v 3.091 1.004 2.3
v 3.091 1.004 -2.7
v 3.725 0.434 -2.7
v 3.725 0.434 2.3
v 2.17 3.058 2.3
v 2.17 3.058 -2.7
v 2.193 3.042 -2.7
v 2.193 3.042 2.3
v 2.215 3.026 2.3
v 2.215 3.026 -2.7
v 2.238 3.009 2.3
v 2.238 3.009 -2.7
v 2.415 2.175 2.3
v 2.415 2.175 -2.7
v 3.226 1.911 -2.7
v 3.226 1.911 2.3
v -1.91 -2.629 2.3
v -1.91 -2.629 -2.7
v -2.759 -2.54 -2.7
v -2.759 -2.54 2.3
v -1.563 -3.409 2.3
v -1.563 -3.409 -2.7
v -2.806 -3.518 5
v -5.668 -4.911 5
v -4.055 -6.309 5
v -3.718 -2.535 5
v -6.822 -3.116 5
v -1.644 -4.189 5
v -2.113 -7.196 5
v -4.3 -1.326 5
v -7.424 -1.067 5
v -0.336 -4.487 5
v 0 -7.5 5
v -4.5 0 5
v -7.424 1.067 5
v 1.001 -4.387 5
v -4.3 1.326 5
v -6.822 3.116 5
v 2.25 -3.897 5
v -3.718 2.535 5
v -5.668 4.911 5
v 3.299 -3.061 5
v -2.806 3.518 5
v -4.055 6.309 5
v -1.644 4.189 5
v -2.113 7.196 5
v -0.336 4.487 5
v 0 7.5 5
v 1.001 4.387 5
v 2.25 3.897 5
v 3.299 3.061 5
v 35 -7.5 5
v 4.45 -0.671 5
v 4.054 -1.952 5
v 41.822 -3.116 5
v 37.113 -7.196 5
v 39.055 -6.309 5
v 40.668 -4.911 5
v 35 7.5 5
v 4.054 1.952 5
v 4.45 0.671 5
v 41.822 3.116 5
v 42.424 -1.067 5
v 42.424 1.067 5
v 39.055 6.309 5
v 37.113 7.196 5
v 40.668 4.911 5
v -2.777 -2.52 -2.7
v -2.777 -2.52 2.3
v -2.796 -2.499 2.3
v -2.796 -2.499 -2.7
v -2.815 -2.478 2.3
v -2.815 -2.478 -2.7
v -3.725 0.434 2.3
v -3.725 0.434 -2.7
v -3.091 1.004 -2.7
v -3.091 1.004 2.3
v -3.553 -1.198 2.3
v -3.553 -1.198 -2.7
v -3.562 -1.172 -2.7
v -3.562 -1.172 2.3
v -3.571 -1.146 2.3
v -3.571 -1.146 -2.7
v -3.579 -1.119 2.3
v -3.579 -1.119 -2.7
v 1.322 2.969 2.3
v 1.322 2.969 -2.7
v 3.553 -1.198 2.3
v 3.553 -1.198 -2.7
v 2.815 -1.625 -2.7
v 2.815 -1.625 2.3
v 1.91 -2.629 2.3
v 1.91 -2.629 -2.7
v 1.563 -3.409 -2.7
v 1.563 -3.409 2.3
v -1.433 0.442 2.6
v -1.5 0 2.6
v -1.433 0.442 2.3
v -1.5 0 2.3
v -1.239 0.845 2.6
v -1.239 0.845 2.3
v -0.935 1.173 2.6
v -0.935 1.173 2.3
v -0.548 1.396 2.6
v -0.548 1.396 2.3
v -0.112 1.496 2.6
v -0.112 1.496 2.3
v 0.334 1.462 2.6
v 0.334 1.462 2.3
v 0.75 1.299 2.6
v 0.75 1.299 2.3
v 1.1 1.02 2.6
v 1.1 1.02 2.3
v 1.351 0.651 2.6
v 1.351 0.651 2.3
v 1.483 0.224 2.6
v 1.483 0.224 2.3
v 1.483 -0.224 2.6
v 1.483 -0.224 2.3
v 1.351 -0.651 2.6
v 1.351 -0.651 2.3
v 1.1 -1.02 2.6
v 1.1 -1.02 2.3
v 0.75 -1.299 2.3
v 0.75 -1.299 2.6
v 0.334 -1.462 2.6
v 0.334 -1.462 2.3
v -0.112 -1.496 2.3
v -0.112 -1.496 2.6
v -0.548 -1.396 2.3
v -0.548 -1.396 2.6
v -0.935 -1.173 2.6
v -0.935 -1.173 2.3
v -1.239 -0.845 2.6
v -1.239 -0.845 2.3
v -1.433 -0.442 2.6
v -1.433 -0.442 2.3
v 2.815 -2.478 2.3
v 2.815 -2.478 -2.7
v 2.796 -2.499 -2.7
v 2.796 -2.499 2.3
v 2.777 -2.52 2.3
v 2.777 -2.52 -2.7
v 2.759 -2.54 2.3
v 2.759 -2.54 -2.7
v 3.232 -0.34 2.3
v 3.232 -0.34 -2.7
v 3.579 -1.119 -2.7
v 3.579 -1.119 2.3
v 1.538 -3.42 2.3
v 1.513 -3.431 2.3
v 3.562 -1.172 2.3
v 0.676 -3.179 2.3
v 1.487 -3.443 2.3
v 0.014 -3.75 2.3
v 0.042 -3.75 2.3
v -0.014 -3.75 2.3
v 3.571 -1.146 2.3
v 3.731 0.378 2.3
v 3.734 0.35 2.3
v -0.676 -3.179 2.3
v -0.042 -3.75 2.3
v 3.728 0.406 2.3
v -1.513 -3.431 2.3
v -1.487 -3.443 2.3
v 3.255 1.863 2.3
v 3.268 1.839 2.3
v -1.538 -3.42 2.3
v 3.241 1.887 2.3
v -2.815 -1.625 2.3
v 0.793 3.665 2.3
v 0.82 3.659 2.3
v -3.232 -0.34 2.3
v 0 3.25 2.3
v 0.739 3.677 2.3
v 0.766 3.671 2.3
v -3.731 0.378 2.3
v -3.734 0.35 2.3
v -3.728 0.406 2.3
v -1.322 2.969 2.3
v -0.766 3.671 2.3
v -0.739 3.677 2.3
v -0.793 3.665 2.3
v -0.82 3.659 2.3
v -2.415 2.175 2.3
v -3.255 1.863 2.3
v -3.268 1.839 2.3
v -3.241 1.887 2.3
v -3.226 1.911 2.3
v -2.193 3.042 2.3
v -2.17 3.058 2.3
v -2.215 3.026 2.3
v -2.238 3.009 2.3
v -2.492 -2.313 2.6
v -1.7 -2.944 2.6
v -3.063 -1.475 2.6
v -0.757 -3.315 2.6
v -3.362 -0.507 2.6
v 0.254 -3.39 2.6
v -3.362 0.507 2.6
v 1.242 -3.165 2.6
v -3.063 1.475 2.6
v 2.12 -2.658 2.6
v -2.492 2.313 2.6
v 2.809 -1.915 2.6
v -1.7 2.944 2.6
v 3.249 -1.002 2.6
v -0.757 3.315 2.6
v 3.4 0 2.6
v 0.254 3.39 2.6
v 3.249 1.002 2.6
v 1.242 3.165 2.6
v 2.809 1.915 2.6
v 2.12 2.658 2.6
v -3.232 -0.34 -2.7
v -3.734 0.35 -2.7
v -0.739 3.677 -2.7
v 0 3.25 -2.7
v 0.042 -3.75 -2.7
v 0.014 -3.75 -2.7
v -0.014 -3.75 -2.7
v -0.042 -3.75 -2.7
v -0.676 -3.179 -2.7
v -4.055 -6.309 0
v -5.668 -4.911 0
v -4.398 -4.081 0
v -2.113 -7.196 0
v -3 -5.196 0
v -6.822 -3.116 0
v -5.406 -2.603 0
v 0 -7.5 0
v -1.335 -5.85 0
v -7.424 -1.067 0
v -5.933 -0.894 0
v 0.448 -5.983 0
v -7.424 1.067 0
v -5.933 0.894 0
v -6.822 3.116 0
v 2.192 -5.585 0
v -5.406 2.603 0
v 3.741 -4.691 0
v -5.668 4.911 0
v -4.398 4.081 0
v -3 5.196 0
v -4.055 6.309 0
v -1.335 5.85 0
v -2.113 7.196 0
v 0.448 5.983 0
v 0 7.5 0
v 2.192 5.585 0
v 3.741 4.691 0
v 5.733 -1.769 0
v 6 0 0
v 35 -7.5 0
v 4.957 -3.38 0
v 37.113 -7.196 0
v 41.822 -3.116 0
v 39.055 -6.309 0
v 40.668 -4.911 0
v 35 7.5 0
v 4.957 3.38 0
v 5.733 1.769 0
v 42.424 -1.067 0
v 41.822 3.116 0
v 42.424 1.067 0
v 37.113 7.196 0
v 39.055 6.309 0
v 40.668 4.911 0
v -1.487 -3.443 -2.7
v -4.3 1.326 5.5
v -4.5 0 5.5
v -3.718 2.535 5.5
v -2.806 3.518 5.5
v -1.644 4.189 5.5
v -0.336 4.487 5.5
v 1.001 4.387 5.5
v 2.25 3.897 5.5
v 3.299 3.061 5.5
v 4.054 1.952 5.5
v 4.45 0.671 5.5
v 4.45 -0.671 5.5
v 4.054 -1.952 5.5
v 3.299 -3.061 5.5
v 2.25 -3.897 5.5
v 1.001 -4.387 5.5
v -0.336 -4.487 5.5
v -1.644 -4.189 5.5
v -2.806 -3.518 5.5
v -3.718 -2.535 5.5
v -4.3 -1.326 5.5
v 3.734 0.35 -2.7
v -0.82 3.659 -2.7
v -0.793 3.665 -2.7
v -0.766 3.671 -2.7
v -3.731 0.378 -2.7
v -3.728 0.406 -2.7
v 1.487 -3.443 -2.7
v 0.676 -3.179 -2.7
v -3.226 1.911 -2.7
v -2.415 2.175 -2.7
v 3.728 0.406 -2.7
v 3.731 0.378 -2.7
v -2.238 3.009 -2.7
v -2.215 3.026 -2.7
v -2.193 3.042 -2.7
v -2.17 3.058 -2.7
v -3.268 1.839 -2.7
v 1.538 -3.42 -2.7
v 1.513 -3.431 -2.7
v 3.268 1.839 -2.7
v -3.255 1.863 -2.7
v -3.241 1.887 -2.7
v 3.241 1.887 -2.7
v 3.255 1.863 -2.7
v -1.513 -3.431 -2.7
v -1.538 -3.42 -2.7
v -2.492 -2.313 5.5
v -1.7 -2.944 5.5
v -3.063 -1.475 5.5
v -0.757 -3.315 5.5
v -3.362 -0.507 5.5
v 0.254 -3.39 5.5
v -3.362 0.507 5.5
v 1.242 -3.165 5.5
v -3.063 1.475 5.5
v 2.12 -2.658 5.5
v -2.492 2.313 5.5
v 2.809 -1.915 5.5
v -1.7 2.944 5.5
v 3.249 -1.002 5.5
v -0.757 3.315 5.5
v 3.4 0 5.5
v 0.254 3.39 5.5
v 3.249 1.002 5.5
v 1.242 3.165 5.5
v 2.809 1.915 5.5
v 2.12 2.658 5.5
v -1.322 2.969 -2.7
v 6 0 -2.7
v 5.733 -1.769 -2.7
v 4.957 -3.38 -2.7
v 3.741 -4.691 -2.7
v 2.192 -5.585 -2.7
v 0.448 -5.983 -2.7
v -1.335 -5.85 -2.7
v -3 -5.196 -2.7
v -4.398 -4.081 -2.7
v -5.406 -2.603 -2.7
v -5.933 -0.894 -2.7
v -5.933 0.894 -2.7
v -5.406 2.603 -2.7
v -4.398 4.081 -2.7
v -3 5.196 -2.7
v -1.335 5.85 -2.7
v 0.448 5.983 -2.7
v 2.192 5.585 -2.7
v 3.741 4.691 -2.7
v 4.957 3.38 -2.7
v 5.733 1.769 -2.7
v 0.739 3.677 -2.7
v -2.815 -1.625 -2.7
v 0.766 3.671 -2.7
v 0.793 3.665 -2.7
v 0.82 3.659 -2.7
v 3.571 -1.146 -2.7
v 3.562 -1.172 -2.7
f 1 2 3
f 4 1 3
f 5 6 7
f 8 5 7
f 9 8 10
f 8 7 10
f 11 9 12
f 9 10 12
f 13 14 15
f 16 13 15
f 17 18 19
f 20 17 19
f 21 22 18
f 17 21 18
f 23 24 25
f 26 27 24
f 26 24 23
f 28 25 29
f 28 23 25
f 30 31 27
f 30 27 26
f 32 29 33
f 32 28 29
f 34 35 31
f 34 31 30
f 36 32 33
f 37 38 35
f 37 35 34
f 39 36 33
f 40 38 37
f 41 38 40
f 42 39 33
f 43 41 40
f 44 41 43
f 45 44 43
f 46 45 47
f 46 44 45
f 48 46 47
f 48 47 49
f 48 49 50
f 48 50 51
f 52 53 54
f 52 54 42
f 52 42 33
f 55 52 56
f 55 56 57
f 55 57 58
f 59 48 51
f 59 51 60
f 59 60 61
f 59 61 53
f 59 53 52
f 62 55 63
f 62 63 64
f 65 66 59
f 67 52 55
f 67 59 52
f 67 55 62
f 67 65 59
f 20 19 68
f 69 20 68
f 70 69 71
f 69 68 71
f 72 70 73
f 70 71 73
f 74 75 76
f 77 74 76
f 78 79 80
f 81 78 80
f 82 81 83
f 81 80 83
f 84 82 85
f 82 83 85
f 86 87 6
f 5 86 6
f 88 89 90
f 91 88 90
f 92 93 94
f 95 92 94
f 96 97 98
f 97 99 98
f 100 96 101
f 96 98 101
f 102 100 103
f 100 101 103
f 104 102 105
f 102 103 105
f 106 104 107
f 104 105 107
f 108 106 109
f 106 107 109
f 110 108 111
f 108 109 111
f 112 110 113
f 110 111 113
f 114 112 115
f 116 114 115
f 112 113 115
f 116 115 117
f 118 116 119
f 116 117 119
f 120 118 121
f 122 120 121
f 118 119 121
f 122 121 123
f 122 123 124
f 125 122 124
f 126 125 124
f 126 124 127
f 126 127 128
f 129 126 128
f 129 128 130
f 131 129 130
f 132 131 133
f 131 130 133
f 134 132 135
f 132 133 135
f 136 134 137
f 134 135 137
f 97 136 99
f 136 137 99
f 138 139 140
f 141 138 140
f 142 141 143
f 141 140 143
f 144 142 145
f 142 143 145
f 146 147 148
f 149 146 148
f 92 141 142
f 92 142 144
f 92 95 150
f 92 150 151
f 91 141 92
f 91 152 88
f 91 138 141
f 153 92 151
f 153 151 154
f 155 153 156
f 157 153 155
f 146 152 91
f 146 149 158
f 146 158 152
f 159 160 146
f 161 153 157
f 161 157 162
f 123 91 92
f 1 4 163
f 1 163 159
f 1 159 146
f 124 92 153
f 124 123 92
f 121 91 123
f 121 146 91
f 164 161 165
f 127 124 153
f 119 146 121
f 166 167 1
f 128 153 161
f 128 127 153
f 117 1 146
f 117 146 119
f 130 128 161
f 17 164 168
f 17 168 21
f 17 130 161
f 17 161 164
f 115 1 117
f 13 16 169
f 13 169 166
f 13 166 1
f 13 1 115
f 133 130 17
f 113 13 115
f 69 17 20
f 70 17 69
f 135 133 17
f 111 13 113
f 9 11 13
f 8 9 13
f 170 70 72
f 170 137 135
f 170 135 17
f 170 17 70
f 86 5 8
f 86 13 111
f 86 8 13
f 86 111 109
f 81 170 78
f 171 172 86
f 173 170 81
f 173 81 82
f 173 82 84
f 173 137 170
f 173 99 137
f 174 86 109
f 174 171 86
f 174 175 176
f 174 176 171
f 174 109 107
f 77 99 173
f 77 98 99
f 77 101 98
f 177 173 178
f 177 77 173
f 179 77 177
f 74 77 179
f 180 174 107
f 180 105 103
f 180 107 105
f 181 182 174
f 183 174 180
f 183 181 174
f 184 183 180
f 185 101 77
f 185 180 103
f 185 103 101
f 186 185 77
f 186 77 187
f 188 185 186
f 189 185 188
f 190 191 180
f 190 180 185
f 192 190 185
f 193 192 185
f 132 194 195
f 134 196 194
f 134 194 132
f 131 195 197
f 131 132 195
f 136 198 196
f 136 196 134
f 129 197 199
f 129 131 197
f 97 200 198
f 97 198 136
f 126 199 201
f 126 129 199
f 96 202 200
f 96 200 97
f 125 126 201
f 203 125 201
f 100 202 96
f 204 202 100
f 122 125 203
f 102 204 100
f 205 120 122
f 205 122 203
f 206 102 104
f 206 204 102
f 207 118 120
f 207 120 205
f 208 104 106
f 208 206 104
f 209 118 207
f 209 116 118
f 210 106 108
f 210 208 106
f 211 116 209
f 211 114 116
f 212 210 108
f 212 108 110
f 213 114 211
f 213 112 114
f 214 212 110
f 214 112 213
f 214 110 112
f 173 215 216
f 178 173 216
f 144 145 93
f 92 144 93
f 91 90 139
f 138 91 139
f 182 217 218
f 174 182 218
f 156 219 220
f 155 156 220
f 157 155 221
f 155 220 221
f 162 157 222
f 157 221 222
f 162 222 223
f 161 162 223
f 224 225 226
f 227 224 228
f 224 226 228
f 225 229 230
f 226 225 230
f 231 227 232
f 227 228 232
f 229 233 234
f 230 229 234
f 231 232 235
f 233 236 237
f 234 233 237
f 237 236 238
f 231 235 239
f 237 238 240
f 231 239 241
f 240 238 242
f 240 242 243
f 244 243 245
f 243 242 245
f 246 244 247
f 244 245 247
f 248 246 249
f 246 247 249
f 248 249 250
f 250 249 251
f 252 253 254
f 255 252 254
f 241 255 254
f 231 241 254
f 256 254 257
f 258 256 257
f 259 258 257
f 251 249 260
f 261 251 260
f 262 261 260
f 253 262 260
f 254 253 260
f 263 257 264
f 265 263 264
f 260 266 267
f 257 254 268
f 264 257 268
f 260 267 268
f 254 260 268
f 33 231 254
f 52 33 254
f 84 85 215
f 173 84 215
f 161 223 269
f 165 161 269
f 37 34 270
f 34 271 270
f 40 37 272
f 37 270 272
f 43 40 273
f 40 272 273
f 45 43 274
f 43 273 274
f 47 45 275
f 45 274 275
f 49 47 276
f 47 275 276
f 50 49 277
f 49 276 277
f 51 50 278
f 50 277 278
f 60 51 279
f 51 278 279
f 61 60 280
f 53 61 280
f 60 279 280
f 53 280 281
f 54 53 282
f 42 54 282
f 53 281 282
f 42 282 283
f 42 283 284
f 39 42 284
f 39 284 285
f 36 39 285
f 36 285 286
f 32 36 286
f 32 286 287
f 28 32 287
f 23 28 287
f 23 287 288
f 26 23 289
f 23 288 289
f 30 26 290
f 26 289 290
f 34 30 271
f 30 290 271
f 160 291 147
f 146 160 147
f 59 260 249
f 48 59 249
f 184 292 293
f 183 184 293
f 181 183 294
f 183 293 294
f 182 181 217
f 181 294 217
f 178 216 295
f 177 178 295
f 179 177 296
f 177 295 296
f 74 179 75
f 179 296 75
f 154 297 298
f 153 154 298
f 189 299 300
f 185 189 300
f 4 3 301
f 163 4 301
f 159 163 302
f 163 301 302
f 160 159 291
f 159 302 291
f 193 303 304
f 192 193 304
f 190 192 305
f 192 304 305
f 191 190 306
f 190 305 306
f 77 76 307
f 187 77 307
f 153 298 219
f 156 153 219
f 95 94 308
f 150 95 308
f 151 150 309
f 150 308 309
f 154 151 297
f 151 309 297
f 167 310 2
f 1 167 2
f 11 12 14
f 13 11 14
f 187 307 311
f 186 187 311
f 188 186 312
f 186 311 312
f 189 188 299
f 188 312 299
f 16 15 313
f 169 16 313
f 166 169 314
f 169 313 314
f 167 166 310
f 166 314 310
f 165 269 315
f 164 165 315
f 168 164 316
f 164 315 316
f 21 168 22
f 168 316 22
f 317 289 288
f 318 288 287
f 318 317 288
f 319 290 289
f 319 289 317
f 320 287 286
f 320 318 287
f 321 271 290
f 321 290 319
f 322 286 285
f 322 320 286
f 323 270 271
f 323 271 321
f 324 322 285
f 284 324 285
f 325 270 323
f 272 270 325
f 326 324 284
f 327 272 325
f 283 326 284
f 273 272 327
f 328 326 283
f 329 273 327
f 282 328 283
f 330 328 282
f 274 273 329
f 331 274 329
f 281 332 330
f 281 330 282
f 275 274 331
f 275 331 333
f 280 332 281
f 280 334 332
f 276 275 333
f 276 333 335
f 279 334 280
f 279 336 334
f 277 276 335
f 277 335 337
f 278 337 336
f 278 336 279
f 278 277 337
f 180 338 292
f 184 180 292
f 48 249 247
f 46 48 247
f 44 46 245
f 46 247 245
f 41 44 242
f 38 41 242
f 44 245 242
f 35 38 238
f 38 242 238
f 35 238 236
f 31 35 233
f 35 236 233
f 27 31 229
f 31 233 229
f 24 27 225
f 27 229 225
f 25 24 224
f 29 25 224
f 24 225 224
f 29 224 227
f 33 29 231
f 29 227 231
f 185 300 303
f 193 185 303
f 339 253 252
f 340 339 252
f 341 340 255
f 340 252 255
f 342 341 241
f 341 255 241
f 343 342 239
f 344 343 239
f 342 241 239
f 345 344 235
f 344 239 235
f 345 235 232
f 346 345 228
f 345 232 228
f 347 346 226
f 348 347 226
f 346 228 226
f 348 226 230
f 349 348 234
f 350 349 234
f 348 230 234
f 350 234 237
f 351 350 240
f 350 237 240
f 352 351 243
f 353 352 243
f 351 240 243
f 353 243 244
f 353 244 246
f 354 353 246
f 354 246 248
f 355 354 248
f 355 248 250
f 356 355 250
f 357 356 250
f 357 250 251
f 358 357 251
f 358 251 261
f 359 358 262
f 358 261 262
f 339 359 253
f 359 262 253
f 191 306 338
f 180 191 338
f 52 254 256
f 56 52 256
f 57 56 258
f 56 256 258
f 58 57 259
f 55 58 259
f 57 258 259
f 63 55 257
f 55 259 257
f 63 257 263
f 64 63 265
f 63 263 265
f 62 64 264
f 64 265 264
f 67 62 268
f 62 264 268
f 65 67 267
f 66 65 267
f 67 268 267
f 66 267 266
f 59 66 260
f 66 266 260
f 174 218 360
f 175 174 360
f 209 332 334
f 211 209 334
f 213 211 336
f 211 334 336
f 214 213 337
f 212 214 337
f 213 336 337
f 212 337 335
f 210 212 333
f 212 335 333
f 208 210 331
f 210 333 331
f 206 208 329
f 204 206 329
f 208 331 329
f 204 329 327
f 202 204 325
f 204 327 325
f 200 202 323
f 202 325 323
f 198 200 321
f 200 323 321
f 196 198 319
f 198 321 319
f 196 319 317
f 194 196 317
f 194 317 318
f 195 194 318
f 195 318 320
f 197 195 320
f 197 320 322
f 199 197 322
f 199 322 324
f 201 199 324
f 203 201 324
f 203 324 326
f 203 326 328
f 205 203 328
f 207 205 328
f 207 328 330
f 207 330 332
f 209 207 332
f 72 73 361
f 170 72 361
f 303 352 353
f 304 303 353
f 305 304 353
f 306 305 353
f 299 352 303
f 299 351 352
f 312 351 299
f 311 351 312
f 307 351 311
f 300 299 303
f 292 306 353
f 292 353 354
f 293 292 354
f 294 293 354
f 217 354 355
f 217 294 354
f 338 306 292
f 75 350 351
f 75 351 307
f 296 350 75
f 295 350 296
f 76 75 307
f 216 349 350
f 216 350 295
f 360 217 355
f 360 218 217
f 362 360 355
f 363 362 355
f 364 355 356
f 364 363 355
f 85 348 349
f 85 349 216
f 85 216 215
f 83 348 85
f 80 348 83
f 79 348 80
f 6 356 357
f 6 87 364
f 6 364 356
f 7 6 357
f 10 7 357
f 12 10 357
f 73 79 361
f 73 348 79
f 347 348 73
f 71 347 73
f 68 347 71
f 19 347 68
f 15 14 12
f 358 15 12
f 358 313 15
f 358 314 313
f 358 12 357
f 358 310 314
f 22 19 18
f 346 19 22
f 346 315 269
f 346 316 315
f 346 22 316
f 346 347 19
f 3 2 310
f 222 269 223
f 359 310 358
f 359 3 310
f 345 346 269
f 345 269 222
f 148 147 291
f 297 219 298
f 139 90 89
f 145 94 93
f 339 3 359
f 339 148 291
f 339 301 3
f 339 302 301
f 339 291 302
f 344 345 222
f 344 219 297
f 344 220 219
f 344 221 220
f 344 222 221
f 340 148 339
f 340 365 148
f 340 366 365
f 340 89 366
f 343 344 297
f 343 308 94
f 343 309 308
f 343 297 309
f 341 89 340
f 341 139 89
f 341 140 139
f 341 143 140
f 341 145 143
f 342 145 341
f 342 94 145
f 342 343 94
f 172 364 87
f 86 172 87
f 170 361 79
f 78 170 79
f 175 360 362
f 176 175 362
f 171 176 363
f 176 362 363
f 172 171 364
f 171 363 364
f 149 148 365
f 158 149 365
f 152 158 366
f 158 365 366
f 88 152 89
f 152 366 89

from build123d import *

# Parameters (mm, degrees)
EXTRUDE_1_DEPTH                = 5
SKETCH_2_R                     = 6
EXTRUDE_2_DEPTH                = 2.7
CUT_EXTRUDE_1_DEPTH            = 5
SKETCH_4_W                     = 4.5
SKETCH_4_H                     = 0.5
HOLE_WIZARD_M2_5_1_D           = 3
HOLE_WIZARD_M2_5_1_DEPTH       = 8.2
HOLE_WIZARD_M2_5_1_CBORE_D     = 6.8
HOLE_WIZARD_M2_5_1_CBORE_DEPTH = 2.9


with BuildPart() as part:
    # 스케치1 → 보스-돌출1 (new body)
    with BuildSketch(Plane(origin=(0, 0, 0), x_dir=(-1, 0, 0), z_dir=(0, 0, -1))):
        with BuildLine():
            Line((0, -7.5), (-35, -7.5))
            ThreePointArc((-35, -7.5), (-42.5, 0), (-35, 7.5))
            Line((-35, 7.5), (0, 7.5))
            ThreePointArc((0, 7.5), (7.5, 0), (0, -7.5))
        make_face()
    extrude(amount=-EXTRUDE_1_DEPTH)

    # 스케치2 → 보스-돌출2 (add)
    with BuildSketch(Plane(origin=(0, 0, 0), x_dir=(-1, 0, 0), z_dir=(0, 0, -1))):
        with Locations(Location((0, 0, 0), (0, 0, 180))):
            Circle(SKETCH_2_R)
    extrude(amount=EXTRUDE_2_DEPTH)

    # 스케치3 → 컷-돌출1 (cut)
    with BuildSketch(Plane(origin=(0, 0, -2.7), x_dir=(-1, 0, 0), z_dir=(0, 0, -1))):
        with BuildLine():
            Line((-0.820496547, 3.65913725), (-1.32189409, 2.969022737))
            Line((-1.32189409, 2.969022737), (-2.170249561, 3.05818849))
            ThreePointArc((-2.170249561, 3.05818849), (-2.204194696, 3.033813729), (-2.237866095, 3.009062203))
            Line((-2.237866095, 3.009062203), (-2.415220683, 2.174674471))
            Line((-2.415220683, 2.174674471), (-3.226498949, 1.911074183))
            ThreePointArc((-3.226498949, 1.911074183), (-3.247595264, 1.875), (-3.268288265, 1.838692964))
            Line((-3.268288265, 1.838692964), (-3.090933678, 1.004305232))
            Line((-3.090933678, 1.004305232), (-3.724857357, 0.433517788))
            ThreePointArc((-3.724857357, 0.433517788), (-3.729457108, 0.391981737), (-3.733593703, 0.350397007))
            Line((-3.733593703, 0.350397007), (-3.23219616, -0.339717506))
            Line((-3.23219616, -0.339717506), (-3.579154088, -1.118997772))
            ThreePointArc((-3.579154088, -1.118997772), (-3.566461936, -1.158813729), (-3.55332687, -1.198485775))
            Line((-3.55332687, -1.198485775), (-2.814582562, -1.625))
            Line((-2.814582562, -1.625), (-2.814582562, -2.47802845))
            ThreePointArc((-2.814582562, -2.47802845), (-2.786793096, -2.509239774), (-2.758657541, -2.540139479))
            Line((-2.758657541, -2.540139479), (-1.91030207, -2.629305232))
            Line((-1.91030207, -2.629305232), (-1.563344142, -3.408585498))
            ThreePointArc((-1.563344142, -3.408585498), (-1.525262412, -3.425795466), (-1.486991261, -3.44257999))
            Line((-1.486991261, -3.44257999), (-0.675712995, -3.178979702))
            Line((-0.675712995, -3.178979702), (-0.041789316, -3.749767147))
            ThreePointArc((-0.041789316, -3.749767147), (0, -3.75), (0.041789316, -3.749767147))
            Line((0.041789316, -3.749767147), (0.675712995, -3.178979702))
            Line((0.675712995, -3.178979702), (1.486991261, -3.44257999))
            ThreePointArc((1.486991261, -3.44257999), (1.525262412, -3.425795466), (1.563344142, -3.408585498))
            Line((1.563344142, -3.408585498), (1.91030207, -2.629305232))
            Line((1.91030207, -2.629305232), (2.758657541, -2.540139479))
            ThreePointArc((2.758657541, -2.540139479), (2.786793096, -2.509239774), (2.814582562, -2.47802845))
            Line((2.814582562, -2.47802845), (2.814582562, -1.625))
            Line((2.814582562, -1.625), (3.55332687, -1.198485775))
            ThreePointArc((3.55332687, -1.198485775), (3.566461936, -1.158813729), (3.579154088, -1.118997772))
            Line((3.579154088, -1.118997772), (3.23219616, -0.339717506))
            Line((3.23219616, -0.339717506), (3.733593703, 0.350397007))
            ThreePointArc((3.733593703, 0.350397007), (3.729457108, 0.391981737), (3.724857357, 0.433517788))
            Line((3.724857357, 0.433517788), (3.090933678, 1.004305232))
            Line((3.090933678, 1.004305232), (3.268288265, 1.838692964))
            ThreePointArc((3.268288265, 1.838692964), (3.247595264, 1.875), (3.226498949, 1.911074183))
            Line((3.226498949, 1.911074183), (2.415220683, 2.174674471))
            Line((2.415220683, 2.174674471), (2.237866095, 3.009062203))
            ThreePointArc((2.237866095, 3.009062203), (2.204194696, 3.033813729), (2.170249561, 3.05818849))
            Line((2.170249561, 3.05818849), (1.32189409, 2.969022737))
            Line((1.32189409, 2.969022737), (0.820496547, 3.65913725))
            ThreePointArc((0.820496547, 3.65913725), (0.779668841, 3.668053503), (0.738744308, 3.676514225))
            Line((0.738744308, 3.676514225), (0, 3.25))
            Line((0, 3.25), (-0.738744308, 3.676514225))
            ThreePointArc((-0.738744308, 3.676514225), (-0.779668841, 3.668053503), (-0.820496547, 3.65913725))
        make_face()
    extrude(amount=-CUT_EXTRUDE_1_DEPTH, mode=Mode.SUBTRACT)

    # 스케치4 → 회전1 (revolve)
    with BuildSketch(Plane.XZ, mode=Mode.PRIVATE) as revolve_1_sk:
        with Locations((2.25, 5.25)):
            Rectangle(SKETCH_4_W, SKETCH_4_H)
    revolve(revolve_1_sk.sketch.rotate(Axis((0, 0, 5.5), (0, 0, -1)), 180), axis=Axis((0, 0, 5.5), (0, 0, -1)))

    # M2.5 육각 머리 작은 나사용 카운터보어1
    with Locations(Plane.XY.offset(5.5)):
        with Locations((0, 0)):
            CounterBoreHole(HOLE_WIZARD_M2_5_1_D / 2, HOLE_WIZARD_M2_5_1_CBORE_D / 2, HOLE_WIZARD_M2_5_1_CBORE_DEPTH, depth=HOLE_WIZARD_M2_5_1_DEPTH)


solid = part.part
